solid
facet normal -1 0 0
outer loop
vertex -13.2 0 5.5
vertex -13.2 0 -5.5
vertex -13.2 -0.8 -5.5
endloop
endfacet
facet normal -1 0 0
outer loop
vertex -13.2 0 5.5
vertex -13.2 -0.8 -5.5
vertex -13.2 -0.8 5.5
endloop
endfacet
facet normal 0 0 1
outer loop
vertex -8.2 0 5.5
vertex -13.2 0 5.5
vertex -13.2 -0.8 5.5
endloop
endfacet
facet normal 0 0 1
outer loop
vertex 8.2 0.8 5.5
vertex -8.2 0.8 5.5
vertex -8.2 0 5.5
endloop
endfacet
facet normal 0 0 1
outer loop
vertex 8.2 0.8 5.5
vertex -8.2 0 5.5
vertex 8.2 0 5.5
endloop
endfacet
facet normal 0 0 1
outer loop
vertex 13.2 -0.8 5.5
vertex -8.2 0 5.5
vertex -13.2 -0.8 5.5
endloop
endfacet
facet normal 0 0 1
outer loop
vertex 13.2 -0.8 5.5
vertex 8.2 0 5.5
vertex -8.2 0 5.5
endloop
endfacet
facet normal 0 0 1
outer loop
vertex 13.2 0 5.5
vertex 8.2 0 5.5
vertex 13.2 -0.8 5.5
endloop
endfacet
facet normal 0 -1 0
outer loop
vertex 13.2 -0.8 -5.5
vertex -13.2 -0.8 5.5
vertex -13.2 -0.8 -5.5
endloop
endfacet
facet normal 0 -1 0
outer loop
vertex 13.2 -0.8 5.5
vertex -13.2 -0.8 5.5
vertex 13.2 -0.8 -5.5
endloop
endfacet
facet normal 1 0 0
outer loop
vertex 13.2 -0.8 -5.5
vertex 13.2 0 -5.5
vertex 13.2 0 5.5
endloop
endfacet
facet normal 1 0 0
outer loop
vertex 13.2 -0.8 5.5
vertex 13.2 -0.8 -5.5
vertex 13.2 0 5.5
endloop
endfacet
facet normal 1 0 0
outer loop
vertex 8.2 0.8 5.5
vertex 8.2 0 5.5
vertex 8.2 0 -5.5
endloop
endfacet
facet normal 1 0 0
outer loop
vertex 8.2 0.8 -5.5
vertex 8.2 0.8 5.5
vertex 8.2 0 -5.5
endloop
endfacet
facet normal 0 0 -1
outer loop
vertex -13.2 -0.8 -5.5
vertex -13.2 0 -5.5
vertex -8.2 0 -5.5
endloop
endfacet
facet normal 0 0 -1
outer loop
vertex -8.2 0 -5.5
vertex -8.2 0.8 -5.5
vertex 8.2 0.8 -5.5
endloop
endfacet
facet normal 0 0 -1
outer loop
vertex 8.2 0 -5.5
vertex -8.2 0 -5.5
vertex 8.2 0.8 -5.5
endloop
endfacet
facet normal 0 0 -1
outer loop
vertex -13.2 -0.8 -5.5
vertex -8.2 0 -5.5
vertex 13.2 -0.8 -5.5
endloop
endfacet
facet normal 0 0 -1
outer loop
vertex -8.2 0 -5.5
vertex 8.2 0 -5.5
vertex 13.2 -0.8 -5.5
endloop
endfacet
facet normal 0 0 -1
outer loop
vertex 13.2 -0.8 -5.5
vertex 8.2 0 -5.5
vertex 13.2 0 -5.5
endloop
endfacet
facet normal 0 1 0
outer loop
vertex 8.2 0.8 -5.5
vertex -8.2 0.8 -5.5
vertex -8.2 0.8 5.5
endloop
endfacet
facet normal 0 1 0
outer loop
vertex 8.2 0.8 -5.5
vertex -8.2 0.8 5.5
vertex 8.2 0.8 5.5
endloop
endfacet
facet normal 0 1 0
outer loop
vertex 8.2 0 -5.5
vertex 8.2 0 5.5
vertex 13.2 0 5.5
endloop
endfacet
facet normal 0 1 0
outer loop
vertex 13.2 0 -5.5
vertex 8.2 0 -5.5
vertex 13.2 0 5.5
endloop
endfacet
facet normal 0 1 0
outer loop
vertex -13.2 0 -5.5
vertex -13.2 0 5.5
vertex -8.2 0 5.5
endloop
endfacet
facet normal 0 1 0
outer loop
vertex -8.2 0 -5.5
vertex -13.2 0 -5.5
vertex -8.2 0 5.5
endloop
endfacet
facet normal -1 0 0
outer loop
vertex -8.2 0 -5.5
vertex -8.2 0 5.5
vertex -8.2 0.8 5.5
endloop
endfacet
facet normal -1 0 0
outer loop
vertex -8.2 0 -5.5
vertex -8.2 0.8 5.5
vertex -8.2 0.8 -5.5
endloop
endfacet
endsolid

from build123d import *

# Parameters (mm, degrees)
SKETCH_1_W      = 16.4
SKETCH_1_H      = 11
EXTRUDE_1_DEPTH = 0.8
SKETCH_3_W      = 26.4
SKETCH_3_H      = 11
EXTRUDE_2_DEPTH = 0.8


with BuildPart() as part:
    # Эскиз1 → Бобышка-Вытянуть1 (new body)
    with BuildSketch(Plane(origin=(0, 0, 0), x_dir=(1, 0, 0), z_dir=(0, 1, 0))):
        Rectangle(SKETCH_1_W, SKETCH_1_H)
    extrude(amount=EXTRUDE_1_DEPTH)

    # Эскиз3 → Бобышка-Вытянуть2 (add)
    with BuildSketch(Plane.XZ):
        Rectangle(SKETCH_3_W, SKETCH_3_H)
    extrude(amount=EXTRUDE_2_DEPTH)


solid = part.part
